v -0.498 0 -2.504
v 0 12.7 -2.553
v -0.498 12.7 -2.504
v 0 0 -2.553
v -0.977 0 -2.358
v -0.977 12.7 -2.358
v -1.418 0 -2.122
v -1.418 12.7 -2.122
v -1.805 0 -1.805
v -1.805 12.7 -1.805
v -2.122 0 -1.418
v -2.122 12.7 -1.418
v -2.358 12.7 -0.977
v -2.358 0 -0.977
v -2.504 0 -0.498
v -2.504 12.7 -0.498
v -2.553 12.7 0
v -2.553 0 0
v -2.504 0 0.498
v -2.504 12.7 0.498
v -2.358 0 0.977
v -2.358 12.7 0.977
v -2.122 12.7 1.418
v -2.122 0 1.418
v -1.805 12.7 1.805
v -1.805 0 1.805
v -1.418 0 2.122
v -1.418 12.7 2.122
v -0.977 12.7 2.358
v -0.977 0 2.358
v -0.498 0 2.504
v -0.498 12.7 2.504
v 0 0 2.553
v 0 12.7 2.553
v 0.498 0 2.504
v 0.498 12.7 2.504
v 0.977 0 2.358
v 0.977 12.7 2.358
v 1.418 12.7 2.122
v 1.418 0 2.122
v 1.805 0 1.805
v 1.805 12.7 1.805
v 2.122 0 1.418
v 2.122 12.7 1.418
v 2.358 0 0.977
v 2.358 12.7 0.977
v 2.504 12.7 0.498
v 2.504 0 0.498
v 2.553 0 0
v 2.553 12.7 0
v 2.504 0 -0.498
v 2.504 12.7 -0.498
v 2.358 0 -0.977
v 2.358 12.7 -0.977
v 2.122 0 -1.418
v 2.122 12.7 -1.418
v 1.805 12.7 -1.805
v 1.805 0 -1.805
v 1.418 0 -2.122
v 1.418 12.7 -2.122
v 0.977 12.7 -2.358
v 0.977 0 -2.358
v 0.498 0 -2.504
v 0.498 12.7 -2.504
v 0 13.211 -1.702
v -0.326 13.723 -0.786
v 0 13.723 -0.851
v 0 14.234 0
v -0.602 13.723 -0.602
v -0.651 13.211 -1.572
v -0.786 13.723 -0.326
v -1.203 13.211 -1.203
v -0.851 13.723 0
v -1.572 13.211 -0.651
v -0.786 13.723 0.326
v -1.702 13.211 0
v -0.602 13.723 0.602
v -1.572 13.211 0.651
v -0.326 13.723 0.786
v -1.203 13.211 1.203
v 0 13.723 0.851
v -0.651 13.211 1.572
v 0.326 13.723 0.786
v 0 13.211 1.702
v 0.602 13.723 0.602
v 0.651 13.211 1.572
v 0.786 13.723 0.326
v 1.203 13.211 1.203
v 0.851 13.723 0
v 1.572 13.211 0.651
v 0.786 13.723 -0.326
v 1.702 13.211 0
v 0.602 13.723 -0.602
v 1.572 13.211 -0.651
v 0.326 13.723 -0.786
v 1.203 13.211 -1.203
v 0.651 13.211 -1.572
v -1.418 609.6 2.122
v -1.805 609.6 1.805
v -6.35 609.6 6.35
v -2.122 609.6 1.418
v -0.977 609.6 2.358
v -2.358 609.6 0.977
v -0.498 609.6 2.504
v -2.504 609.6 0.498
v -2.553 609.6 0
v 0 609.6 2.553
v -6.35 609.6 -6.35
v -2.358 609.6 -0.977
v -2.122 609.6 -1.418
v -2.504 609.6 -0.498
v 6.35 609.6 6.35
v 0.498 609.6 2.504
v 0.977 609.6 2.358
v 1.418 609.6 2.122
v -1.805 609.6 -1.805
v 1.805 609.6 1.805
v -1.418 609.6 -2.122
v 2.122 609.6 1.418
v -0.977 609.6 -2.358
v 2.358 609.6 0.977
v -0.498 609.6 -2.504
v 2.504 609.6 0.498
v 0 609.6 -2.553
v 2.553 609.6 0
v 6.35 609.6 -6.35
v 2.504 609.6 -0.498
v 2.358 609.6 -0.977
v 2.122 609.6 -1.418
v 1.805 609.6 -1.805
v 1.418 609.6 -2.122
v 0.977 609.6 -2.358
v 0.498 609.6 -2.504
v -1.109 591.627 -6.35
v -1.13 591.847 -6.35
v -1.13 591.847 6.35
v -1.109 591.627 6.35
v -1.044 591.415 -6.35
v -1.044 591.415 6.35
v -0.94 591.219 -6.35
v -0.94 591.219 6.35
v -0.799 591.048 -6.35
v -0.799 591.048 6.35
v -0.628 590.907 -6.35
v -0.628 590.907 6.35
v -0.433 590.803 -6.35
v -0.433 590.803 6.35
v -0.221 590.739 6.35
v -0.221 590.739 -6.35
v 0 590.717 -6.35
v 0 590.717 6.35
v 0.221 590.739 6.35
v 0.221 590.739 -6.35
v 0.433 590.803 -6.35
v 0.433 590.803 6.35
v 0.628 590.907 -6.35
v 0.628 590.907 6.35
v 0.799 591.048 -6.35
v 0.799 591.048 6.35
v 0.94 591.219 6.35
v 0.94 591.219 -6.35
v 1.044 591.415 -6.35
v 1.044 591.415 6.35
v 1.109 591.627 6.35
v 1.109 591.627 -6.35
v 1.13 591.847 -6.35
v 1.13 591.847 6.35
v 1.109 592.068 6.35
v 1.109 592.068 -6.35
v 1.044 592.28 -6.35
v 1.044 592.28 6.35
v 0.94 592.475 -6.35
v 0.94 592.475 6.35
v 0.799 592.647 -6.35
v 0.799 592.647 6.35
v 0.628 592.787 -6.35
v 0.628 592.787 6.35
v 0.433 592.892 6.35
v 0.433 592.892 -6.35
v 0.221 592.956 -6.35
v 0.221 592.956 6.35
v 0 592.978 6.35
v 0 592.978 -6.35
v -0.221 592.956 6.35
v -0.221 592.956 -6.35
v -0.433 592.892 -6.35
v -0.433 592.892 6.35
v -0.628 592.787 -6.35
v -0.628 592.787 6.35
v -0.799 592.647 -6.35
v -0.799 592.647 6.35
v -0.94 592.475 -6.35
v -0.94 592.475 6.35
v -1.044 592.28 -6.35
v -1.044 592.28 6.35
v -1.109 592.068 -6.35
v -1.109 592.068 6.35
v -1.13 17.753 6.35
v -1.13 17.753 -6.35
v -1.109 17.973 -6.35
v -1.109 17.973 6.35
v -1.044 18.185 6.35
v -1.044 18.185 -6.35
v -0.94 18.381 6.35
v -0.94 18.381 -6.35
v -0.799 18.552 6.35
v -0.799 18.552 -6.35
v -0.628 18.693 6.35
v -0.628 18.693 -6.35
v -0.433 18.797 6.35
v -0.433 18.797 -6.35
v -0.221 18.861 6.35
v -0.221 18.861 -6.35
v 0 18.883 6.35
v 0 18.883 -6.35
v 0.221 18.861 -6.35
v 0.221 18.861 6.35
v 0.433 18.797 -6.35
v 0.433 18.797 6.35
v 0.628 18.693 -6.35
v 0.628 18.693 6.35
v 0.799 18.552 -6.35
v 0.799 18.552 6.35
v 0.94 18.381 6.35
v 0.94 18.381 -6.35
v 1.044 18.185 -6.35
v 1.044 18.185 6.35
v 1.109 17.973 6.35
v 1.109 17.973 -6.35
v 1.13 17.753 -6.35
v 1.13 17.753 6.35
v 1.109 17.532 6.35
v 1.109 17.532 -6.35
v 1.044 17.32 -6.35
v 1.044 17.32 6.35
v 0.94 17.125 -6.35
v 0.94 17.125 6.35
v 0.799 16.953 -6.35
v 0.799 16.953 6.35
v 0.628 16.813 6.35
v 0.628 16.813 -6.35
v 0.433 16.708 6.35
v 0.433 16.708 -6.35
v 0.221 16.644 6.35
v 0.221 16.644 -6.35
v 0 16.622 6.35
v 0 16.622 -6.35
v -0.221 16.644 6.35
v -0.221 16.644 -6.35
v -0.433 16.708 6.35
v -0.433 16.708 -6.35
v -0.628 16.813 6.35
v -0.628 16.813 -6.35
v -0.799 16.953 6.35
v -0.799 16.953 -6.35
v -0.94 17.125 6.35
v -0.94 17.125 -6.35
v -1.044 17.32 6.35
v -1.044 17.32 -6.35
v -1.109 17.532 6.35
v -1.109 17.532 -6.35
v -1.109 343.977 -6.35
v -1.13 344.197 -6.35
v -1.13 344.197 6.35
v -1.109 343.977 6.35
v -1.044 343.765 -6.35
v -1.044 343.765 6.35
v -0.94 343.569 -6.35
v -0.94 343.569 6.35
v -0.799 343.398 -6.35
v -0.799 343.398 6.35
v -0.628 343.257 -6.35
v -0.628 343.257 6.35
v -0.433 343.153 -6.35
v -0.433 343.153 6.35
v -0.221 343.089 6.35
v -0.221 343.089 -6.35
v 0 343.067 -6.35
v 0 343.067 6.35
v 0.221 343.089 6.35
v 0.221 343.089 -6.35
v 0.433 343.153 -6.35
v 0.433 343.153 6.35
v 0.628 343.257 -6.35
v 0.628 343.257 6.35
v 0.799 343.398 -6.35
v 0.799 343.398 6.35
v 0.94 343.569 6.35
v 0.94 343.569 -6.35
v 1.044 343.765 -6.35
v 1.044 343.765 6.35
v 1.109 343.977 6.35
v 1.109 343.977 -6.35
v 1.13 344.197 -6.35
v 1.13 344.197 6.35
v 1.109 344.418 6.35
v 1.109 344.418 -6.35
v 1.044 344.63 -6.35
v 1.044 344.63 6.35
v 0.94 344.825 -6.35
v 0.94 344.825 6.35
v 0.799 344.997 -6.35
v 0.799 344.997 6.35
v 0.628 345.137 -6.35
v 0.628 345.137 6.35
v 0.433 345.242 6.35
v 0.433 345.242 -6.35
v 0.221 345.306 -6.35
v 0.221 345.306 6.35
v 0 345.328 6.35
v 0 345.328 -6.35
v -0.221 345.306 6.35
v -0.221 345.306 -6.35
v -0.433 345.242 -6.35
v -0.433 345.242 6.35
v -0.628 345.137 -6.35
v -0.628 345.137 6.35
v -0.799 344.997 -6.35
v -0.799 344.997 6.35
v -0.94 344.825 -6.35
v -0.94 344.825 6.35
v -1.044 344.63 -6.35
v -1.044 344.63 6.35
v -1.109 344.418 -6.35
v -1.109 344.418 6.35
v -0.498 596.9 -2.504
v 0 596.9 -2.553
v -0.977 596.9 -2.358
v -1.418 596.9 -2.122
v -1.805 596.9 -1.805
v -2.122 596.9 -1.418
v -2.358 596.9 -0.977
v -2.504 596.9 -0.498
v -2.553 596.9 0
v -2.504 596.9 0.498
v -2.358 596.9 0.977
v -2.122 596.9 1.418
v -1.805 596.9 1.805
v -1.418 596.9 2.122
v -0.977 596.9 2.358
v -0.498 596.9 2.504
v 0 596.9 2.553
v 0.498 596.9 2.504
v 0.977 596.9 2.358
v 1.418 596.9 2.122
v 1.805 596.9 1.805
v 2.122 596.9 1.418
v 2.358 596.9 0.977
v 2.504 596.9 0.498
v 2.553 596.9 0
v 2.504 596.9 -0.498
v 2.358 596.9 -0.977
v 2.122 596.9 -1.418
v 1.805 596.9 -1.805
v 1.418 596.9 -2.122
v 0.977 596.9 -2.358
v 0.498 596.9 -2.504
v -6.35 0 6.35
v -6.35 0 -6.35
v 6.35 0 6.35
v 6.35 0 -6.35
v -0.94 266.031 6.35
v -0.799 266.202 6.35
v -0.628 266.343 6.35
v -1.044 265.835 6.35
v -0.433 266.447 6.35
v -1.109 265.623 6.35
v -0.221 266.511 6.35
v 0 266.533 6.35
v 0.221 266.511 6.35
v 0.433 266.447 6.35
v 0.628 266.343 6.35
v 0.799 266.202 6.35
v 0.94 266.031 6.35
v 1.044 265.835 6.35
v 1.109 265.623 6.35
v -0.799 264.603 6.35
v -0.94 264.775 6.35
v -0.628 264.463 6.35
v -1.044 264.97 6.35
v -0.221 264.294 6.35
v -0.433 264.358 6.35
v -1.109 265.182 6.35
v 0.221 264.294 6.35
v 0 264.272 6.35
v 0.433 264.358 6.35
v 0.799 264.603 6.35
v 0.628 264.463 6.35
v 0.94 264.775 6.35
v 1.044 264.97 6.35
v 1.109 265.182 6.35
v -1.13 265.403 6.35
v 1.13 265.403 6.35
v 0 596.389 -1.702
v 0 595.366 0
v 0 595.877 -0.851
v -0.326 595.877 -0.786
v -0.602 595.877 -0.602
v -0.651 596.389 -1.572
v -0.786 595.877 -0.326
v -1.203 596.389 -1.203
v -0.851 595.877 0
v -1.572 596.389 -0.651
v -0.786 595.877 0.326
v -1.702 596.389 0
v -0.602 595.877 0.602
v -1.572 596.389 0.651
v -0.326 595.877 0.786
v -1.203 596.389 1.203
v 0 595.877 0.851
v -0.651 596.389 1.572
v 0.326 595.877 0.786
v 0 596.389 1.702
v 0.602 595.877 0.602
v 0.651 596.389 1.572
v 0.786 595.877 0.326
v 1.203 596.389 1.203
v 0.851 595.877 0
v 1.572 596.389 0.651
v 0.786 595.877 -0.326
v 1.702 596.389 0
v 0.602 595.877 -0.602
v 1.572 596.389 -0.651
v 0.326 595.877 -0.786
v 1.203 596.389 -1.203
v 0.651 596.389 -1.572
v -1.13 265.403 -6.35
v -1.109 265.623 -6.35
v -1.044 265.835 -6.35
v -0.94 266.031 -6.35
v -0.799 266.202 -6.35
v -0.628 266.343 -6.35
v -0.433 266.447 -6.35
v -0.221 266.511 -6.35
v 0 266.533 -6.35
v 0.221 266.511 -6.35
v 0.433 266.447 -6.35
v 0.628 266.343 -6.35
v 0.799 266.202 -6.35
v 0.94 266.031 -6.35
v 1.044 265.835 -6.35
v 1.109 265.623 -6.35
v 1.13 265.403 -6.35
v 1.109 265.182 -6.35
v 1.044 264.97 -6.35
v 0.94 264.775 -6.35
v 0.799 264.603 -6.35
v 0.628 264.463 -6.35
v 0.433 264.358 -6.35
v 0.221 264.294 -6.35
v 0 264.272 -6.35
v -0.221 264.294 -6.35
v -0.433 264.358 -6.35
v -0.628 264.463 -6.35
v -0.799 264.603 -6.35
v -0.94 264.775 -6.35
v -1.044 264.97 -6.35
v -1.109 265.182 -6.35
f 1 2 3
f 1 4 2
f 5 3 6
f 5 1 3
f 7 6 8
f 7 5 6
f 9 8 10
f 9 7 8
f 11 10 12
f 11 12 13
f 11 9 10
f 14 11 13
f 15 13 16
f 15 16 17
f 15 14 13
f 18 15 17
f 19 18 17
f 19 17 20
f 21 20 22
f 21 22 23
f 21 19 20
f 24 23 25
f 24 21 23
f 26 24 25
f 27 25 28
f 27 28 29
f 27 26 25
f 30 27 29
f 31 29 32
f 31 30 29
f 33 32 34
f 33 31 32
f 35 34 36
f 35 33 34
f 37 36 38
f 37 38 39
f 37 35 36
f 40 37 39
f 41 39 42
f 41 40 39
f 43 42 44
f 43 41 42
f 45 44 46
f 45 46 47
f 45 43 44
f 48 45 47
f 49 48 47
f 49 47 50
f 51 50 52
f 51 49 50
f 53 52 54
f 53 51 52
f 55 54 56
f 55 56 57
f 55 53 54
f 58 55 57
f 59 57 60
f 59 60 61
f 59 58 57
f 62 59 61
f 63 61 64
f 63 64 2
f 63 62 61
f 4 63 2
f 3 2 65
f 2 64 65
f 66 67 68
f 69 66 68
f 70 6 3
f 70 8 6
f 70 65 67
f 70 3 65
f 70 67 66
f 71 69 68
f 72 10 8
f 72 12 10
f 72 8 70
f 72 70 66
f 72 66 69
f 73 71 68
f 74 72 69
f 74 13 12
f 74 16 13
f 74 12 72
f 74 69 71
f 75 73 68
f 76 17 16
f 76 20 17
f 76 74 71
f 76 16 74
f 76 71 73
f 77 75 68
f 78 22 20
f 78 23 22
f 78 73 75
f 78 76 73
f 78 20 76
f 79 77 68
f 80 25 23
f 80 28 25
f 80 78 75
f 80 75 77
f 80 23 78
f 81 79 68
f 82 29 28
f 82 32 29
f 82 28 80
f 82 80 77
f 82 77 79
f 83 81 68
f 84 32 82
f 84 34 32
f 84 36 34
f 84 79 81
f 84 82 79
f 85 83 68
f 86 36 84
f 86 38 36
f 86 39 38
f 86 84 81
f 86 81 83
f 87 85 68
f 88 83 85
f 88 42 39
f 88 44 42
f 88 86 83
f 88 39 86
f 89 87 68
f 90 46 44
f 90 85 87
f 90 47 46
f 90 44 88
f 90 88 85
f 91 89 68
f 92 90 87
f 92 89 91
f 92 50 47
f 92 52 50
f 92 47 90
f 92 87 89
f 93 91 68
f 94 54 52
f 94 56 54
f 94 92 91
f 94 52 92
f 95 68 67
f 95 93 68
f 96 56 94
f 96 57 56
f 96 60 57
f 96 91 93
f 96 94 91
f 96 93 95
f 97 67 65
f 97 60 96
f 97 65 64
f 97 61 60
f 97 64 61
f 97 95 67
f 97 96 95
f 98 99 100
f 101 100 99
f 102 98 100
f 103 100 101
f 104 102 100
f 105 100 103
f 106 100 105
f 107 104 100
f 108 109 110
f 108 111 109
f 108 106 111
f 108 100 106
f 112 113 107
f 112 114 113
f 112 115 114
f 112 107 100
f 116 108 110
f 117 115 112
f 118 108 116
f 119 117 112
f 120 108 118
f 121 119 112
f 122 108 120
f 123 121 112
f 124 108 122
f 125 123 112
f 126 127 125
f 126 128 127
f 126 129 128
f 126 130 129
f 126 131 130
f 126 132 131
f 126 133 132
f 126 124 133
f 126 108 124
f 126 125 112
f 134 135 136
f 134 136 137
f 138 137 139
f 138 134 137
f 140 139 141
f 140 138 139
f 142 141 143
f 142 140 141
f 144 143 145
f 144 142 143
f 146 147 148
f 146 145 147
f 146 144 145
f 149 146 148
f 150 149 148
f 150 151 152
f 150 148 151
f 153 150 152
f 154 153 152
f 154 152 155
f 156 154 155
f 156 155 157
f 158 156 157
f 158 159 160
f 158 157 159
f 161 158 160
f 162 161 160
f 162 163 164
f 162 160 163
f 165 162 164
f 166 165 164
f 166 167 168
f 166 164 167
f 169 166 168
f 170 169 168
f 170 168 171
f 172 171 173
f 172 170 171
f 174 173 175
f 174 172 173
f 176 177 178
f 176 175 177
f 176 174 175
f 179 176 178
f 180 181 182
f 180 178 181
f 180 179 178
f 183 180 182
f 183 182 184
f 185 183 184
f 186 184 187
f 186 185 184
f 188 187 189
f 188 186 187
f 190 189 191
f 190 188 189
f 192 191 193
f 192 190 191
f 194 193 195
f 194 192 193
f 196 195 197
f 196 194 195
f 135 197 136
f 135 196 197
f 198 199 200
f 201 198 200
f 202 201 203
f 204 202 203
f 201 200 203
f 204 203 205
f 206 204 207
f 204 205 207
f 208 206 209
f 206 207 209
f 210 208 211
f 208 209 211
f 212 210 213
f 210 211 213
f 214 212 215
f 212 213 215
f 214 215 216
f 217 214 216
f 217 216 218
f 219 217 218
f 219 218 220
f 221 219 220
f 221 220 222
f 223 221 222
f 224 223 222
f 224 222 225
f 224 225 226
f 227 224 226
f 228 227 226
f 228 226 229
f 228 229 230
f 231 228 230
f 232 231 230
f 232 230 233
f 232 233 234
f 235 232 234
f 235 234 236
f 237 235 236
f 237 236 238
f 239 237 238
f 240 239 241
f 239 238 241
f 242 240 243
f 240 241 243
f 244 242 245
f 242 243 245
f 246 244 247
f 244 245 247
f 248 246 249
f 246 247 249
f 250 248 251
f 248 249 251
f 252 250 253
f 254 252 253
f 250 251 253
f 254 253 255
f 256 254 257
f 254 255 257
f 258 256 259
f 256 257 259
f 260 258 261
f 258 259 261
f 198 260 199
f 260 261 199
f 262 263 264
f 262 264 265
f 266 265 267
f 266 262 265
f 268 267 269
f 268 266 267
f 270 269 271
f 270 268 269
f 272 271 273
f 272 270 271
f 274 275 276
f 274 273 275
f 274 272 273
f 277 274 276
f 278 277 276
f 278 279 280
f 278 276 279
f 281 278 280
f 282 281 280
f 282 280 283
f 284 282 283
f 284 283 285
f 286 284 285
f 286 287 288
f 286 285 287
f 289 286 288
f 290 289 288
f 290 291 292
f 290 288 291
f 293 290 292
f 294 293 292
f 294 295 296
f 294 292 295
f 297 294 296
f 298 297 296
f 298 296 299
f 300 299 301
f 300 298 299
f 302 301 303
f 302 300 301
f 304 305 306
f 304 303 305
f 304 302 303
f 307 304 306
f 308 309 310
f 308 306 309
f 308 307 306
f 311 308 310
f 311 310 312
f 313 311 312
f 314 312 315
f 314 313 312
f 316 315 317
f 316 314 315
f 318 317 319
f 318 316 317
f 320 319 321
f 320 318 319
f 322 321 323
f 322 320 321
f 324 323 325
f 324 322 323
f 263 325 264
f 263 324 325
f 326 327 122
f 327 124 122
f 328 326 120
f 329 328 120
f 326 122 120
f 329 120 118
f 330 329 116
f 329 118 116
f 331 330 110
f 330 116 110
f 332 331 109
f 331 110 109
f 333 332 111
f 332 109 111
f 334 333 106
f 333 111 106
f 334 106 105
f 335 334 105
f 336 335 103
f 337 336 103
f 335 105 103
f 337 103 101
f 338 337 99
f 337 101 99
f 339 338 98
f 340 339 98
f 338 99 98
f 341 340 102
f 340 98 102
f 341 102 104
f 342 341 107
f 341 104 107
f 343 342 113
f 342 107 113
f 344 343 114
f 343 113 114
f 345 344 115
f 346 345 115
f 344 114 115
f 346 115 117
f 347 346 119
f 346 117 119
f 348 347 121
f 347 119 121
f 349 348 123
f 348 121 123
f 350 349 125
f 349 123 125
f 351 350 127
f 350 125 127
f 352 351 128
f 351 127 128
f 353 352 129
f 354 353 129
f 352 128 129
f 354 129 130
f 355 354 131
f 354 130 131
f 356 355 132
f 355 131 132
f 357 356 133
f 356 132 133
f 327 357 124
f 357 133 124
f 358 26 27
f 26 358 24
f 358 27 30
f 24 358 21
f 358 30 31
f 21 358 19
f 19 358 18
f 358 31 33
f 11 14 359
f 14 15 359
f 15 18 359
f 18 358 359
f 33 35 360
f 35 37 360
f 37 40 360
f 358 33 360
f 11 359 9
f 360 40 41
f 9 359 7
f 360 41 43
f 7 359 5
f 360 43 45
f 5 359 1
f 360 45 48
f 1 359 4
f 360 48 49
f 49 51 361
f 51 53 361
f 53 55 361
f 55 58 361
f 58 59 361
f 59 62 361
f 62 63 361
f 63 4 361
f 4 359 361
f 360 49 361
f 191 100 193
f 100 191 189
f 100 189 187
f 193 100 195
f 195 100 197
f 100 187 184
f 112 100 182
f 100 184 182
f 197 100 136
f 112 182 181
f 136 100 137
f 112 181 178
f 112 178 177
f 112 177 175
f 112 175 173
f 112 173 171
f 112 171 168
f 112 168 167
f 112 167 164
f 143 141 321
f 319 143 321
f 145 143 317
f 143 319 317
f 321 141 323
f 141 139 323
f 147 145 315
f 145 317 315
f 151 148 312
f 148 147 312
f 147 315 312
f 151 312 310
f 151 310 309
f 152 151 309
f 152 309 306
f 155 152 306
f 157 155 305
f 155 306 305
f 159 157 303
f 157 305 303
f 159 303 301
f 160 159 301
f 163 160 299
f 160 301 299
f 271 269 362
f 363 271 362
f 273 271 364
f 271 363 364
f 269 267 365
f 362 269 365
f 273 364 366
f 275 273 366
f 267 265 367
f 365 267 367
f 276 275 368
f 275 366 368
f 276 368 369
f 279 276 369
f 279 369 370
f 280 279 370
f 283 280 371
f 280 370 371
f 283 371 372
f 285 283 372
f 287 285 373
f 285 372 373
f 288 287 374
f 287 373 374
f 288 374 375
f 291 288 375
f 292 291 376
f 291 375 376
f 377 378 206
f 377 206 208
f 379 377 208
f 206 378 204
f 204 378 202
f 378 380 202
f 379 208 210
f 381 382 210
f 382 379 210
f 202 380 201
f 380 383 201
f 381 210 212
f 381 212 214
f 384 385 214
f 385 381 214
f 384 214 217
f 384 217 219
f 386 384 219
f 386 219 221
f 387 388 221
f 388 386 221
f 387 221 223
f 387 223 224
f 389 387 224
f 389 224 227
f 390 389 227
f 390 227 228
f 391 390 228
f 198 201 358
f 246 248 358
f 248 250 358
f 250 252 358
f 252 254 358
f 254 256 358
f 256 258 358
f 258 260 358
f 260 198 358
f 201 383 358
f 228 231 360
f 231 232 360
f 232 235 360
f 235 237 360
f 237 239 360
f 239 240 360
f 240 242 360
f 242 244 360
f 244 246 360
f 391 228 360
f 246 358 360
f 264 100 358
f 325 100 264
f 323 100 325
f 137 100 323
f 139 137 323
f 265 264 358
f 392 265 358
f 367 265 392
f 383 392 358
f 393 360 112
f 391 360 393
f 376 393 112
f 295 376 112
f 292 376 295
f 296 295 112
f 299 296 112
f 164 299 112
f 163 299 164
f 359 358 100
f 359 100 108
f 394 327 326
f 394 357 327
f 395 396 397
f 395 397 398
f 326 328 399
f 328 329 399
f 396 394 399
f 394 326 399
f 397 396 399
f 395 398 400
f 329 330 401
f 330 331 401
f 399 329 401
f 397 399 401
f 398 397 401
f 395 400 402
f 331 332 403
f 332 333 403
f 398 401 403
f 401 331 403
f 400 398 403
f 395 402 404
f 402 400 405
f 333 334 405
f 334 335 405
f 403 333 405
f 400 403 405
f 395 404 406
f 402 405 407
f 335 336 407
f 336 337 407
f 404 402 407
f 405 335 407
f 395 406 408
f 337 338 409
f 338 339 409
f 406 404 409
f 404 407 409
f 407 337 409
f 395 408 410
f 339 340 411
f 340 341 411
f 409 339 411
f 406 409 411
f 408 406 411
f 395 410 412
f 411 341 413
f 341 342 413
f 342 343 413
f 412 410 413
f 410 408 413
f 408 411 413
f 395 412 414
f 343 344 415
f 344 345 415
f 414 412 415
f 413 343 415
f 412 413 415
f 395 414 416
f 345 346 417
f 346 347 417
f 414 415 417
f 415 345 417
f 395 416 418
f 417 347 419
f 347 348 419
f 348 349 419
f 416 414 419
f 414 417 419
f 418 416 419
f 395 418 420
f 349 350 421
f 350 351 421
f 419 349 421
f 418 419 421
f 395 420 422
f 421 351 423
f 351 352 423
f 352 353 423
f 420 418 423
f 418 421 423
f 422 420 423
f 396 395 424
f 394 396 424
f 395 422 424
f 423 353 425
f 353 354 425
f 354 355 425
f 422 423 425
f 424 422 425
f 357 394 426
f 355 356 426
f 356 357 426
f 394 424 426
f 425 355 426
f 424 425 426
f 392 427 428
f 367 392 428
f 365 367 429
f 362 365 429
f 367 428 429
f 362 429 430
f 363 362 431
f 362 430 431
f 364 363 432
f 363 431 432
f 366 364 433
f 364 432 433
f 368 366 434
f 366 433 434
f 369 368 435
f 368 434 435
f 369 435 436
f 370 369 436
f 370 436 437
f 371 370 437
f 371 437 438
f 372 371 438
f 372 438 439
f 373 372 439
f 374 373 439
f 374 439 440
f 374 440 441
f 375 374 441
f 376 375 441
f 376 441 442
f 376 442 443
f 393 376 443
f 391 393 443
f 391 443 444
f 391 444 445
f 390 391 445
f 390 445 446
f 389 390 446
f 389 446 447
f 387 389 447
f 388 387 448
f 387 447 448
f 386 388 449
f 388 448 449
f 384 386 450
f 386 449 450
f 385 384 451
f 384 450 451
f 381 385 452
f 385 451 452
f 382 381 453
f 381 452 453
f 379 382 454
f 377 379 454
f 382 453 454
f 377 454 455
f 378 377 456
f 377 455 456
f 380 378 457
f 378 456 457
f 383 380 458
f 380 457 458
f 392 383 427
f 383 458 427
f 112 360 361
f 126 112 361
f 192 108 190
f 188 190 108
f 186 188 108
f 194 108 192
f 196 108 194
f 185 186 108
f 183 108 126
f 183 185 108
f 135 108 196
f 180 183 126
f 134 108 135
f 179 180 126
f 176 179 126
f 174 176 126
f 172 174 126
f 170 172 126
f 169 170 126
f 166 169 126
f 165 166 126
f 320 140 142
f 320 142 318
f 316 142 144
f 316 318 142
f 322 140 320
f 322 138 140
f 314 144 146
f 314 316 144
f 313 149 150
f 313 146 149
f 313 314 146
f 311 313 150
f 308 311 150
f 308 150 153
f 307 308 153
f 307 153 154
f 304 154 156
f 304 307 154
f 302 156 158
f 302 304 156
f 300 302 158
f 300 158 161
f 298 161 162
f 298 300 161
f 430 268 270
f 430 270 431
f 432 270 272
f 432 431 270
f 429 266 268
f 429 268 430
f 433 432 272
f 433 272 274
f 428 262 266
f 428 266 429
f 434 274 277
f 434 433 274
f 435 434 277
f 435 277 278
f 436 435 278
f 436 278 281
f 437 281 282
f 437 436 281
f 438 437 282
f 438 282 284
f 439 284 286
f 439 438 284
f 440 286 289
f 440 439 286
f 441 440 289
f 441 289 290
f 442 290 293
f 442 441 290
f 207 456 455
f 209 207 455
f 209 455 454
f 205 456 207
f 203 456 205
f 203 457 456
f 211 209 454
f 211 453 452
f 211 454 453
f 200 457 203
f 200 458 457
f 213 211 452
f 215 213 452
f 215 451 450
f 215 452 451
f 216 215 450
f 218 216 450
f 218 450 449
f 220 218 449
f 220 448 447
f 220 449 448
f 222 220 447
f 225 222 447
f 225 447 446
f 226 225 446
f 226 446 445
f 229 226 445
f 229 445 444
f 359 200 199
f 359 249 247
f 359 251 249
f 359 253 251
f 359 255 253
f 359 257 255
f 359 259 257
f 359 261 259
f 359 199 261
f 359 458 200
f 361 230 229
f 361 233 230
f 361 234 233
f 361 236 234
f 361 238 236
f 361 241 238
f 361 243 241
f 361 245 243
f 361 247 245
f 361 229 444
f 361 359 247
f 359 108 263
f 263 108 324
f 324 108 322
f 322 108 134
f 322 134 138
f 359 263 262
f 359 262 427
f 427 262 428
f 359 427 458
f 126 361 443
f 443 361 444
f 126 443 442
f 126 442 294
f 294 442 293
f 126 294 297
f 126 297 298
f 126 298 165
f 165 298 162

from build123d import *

# Parameters (mm, degrees)
SKETCH1_W             = 12.7
SKETCH1_H             = 12.7
BOSS_EXTRUDE1_DEPTH   = 609.6
F_4_40_TAPPED_HOLE2_D = 2.2606


with BuildPart() as part:
    # Sketch1 → Boss-Extrude1 (new body)
    with BuildSketch(Plane(origin=(0, 0, 0), x_dir=(1, 0, 0), z_dir=(0, 1, 0))):
        Rectangle(SKETCH1_W, SKETCH1_H)
    extrude(amount=BOSS_EXTRUDE1_DEPTH)

    # Sketch8 → 1/4-20 Tapped Hole1 (revolve, cut)
    with BuildSketch(Plane(origin=(0, 0, 0), x_dir=(0, 0, -1), z_dir=(1, 0, 0))):
        Polygon((0, 0), (0, 14.233816902), (2.5527, 12.7), (2.5527, 0), align=None)
    f_1_4_20_tapped_hole1 = revolve(axis=Axis((0, -6.35, 0), (0, 1, 0)), mode=Mode.SUBTRACT)

    # #4-40 Tapped Hole2 (through all)
    with Locations(Plane(origin=(0, 17.752734497, 6.35), x_dir=(1, 0, 0), z_dir=(0, 0, 1))):
        with Locations((0, 0), (0, 247.65)):
            f_4_40_tapped_hole2 = Hole(F_4_40_TAPPED_HOLE2_D / 2)

    # Mirror1: 1/4-20 Tapped Hole1, #4-40 Tapped Hole2 across plane
    add(f_1_4_20_tapped_hole1.mirror(Plane.ZX.offset(304.8)), mode=Mode.SUBTRACT)
    add(f_4_40_tapped_hole2.mirror(Plane.ZX.offset(304.8)), mode=Mode.SUBTRACT)


solid = part.part
